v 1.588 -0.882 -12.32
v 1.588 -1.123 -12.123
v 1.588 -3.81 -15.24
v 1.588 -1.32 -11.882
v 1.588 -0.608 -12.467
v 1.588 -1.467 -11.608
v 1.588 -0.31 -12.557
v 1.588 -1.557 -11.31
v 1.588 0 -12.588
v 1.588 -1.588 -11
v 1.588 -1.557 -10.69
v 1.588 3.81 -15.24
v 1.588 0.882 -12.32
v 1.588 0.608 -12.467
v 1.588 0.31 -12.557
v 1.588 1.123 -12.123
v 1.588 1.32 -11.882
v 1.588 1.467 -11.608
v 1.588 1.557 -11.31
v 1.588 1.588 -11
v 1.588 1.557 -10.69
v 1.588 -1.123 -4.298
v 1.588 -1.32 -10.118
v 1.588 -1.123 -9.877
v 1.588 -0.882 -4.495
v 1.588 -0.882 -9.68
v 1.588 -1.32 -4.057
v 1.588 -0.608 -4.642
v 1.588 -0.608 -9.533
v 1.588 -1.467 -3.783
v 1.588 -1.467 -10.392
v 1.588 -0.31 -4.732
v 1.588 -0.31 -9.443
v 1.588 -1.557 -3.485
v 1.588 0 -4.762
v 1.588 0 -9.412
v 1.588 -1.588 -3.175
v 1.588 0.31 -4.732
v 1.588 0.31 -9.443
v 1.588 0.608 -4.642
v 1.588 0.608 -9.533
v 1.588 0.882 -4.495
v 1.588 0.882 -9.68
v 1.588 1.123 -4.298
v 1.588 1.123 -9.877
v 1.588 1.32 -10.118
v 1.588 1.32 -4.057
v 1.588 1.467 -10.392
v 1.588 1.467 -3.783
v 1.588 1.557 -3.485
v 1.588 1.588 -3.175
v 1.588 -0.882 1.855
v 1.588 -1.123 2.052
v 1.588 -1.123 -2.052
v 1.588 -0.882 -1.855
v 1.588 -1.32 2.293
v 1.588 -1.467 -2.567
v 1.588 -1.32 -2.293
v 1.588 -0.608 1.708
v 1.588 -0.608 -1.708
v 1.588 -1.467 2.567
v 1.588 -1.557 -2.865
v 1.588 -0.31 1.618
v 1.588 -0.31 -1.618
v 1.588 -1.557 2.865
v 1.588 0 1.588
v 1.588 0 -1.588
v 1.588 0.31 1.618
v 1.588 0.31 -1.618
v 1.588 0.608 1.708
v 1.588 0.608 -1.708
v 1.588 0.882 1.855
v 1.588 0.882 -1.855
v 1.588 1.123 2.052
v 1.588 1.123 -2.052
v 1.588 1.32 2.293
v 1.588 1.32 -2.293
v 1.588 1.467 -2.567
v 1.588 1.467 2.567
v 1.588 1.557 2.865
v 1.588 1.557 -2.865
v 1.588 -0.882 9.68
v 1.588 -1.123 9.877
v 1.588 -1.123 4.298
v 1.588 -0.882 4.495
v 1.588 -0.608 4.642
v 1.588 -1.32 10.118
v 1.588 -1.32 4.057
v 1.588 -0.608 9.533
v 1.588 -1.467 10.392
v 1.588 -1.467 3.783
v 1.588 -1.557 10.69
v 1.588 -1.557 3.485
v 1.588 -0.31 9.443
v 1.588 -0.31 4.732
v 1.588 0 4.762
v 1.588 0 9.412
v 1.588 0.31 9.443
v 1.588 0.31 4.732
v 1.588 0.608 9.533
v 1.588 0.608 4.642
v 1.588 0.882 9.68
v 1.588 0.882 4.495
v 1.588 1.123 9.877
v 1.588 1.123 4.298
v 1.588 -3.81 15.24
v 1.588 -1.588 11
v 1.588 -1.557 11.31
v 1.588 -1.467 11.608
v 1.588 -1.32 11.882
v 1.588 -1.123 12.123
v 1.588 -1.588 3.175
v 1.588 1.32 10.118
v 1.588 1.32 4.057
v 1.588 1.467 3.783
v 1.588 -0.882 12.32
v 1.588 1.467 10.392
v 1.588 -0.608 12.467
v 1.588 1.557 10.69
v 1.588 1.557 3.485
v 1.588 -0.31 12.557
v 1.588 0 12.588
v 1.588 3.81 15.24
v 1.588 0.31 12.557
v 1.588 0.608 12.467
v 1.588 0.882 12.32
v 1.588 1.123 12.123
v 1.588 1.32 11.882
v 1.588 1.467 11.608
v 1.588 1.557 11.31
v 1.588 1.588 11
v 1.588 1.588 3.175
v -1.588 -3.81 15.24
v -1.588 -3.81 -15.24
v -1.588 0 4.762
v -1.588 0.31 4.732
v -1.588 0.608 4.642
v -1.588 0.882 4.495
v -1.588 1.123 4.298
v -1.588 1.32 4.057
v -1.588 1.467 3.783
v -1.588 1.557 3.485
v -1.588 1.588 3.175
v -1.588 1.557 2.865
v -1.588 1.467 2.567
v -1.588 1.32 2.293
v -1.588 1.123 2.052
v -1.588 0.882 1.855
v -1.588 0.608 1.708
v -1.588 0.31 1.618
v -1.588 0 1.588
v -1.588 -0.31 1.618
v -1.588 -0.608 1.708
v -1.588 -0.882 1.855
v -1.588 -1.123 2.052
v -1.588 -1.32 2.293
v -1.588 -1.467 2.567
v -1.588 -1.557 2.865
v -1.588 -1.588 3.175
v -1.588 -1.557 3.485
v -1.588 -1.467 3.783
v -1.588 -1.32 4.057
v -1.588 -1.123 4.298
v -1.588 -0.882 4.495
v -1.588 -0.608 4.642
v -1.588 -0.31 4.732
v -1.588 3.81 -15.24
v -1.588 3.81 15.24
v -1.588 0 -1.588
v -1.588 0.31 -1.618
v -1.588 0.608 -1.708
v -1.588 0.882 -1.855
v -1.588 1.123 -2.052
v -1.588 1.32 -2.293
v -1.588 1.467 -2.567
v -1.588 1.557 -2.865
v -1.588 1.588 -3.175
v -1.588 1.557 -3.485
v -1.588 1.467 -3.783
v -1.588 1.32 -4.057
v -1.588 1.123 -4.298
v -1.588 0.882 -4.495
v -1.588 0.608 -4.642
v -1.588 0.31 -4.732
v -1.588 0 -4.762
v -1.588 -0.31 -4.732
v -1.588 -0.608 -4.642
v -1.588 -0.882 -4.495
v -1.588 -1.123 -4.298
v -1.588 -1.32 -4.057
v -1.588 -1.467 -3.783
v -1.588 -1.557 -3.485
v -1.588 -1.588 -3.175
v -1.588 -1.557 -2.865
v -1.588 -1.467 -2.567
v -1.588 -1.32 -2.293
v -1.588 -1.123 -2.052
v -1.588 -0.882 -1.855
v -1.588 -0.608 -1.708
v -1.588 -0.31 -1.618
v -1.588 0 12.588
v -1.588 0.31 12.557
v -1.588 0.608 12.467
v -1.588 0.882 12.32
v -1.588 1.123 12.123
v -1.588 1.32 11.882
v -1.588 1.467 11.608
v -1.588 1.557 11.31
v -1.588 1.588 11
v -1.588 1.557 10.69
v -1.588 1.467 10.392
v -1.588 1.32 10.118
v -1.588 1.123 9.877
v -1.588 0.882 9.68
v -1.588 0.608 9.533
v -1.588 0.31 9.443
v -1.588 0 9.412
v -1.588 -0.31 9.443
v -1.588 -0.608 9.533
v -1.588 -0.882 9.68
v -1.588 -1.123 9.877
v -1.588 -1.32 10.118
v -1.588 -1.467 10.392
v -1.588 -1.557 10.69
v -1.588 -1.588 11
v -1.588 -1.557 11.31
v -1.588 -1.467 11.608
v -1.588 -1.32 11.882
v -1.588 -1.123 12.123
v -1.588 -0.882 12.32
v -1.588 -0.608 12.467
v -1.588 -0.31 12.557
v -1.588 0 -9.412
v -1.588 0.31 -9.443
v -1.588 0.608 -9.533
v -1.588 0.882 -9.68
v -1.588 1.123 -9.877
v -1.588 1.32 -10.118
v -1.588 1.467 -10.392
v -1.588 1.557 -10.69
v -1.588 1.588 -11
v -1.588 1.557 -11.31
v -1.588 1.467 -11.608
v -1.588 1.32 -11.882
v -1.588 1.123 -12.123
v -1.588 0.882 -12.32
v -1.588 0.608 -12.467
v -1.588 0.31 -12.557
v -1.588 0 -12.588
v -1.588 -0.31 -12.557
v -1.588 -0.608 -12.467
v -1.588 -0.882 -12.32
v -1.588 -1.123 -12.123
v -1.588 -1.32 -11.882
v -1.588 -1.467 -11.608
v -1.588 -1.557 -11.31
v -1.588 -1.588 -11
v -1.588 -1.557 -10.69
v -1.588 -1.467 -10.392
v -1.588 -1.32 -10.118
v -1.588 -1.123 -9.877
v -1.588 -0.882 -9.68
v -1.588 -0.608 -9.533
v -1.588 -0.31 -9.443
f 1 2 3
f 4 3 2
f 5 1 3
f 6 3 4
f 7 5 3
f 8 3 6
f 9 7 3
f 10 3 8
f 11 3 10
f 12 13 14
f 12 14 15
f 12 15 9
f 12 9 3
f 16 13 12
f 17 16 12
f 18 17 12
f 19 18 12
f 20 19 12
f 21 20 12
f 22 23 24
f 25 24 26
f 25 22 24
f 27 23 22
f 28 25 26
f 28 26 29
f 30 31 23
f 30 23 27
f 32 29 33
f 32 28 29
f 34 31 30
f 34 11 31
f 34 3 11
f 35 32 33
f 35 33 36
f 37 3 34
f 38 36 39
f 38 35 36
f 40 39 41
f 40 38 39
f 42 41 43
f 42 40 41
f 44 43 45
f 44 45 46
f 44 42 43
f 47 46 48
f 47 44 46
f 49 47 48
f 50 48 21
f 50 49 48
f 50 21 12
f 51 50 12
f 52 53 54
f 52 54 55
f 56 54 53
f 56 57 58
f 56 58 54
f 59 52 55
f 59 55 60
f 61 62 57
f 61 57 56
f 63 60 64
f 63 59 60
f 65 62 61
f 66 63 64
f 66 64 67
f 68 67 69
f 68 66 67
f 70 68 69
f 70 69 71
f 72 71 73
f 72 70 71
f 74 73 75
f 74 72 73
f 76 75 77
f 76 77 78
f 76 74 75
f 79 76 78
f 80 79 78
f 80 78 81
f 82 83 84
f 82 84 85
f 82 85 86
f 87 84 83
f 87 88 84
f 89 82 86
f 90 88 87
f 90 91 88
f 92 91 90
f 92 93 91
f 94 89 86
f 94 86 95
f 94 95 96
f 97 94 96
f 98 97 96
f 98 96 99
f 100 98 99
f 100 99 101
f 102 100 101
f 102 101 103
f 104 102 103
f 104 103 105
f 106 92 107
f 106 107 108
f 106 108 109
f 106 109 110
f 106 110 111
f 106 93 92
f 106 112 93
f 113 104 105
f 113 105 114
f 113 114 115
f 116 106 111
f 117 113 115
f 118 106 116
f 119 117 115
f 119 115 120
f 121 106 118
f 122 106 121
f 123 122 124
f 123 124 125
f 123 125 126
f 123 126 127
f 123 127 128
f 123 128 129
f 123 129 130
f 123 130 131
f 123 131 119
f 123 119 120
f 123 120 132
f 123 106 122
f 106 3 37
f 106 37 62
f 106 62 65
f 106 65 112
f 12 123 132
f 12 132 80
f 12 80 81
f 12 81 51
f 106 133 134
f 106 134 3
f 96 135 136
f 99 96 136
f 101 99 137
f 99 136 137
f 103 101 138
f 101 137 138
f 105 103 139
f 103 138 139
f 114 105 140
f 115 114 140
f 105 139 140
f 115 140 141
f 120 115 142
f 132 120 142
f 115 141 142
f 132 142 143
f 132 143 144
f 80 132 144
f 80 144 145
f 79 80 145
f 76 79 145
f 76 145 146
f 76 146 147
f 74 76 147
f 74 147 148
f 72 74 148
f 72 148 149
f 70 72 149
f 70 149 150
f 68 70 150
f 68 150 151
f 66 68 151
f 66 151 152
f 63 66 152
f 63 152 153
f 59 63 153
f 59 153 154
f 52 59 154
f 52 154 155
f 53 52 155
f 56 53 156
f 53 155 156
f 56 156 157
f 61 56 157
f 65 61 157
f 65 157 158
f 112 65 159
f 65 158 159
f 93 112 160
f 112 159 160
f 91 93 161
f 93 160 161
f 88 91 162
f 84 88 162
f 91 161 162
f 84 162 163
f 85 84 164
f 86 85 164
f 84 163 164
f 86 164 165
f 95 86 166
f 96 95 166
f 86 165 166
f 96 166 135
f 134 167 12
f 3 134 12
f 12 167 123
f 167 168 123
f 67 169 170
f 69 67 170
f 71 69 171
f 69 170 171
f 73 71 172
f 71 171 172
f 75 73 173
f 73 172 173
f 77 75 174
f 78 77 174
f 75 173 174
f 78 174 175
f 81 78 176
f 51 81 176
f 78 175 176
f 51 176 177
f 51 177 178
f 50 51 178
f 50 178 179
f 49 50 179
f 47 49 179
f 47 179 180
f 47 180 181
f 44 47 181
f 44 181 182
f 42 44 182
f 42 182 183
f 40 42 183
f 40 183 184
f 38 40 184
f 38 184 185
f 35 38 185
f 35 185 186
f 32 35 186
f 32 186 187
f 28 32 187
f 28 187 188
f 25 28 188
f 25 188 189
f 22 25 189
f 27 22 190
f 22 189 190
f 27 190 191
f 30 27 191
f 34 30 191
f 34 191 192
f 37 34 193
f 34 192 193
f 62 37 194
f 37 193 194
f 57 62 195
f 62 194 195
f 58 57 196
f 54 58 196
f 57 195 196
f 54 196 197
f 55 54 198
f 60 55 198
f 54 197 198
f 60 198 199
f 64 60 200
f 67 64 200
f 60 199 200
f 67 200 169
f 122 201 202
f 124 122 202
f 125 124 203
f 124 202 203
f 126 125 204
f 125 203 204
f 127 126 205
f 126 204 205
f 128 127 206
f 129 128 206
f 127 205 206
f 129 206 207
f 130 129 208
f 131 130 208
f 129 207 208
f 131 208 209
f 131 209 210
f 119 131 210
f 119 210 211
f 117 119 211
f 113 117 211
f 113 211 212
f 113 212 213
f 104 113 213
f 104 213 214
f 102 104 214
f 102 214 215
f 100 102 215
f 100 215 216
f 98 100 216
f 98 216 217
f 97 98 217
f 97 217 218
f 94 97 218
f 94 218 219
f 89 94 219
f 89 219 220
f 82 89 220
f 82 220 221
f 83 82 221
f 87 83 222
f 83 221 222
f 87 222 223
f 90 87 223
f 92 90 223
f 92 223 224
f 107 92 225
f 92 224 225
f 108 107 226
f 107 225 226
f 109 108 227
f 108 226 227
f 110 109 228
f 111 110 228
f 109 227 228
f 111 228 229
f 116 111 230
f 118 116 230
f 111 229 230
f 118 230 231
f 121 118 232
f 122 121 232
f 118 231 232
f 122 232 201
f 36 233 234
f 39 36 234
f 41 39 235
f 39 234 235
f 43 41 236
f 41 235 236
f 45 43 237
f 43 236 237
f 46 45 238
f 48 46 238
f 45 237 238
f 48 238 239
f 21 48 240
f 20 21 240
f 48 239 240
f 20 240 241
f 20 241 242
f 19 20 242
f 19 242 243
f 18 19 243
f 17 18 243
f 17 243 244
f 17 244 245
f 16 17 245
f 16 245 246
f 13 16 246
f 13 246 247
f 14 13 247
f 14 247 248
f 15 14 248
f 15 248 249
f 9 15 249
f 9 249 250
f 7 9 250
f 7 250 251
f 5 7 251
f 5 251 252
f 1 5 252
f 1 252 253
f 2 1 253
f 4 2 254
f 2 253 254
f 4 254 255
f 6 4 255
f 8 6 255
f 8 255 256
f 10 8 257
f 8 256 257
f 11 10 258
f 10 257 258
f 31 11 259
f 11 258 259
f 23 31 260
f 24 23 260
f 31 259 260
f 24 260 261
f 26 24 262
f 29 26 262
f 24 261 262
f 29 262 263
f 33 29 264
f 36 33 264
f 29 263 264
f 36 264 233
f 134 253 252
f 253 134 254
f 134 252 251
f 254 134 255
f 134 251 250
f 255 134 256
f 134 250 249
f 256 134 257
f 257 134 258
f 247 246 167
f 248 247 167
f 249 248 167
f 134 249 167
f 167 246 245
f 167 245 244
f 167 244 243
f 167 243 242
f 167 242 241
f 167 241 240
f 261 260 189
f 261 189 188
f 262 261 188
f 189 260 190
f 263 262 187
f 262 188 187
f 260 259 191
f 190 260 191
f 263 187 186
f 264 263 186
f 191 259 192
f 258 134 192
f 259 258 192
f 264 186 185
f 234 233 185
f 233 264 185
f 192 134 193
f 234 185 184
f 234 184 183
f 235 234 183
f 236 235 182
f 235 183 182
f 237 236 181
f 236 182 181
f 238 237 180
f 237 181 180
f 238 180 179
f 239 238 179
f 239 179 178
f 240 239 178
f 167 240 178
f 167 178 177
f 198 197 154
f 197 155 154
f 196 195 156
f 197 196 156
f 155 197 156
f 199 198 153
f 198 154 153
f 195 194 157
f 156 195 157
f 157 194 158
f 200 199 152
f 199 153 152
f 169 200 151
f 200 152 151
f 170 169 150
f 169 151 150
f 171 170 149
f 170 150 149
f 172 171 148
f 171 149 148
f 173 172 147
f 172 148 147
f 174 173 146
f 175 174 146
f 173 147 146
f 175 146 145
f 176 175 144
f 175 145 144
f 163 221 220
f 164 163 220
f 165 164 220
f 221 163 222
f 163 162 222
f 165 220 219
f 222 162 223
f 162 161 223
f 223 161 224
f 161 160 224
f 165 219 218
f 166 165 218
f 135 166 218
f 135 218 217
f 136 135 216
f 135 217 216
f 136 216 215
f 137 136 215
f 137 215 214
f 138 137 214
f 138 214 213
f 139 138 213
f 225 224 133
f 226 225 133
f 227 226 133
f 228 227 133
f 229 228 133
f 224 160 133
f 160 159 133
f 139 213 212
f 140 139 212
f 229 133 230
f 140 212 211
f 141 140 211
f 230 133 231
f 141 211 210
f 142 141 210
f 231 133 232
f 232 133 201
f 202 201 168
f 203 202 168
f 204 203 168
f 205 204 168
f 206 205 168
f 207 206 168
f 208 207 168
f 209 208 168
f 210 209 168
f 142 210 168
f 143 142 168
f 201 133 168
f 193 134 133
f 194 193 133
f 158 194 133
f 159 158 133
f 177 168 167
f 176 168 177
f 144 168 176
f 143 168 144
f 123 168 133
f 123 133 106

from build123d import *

# Parameters (mm, degrees)
SKETCH1_W           = 3.175
SKETCH1_H           = 7.62
BOSS_EXTRUDE1_DEPTH = 15.24
SKETCH3_R           = 1.5875
CUT_EXTRUDE2_DEPTH  = 4.175
SKETCH5_R           = 1.5875
CUT_EXTRUDE4_DEPTH  = 4.175


with BuildPart() as part:
    # Sketch1 → Boss-Extrude1 (new body)
    with BuildSketch(Plane.XY):
        Rectangle(SKETCH1_W, SKETCH1_H)
    boss_extrude1 = extrude(amount=BOSS_EXTRUDE1_DEPTH)

    # Mirror1: Boss-Extrude1 across plane
    add(boss_extrude1.mirror(Plane.XY))

    # Sketch3 → Cut-Extrude2 (cut, through all)
    with BuildSketch(Plane.ZY.offset(1.5875)):
        with Locations((-3.175, 0)):
            Circle(SKETCH3_R)
        with Locations((3.175, 0)):
            Circle(SKETCH3_R)
    extrude(amount=-CUT_EXTRUDE2_DEPTH, mode=Mode.SUBTRACT)

    # Sketch5 → Cut-Extrude4 (cut, through all)
    with BuildSketch(Plane.ZY.offset(1.5875)):
        with Locations((-11, 0)):
            Circle(SKETCH5_R)
        with Locations((11, 0)):
            Circle(SKETCH5_R)
    extrude(amount=-CUT_EXTRUDE4_DEPTH, mode=Mode.SUBTRACT)


solid = part.part
